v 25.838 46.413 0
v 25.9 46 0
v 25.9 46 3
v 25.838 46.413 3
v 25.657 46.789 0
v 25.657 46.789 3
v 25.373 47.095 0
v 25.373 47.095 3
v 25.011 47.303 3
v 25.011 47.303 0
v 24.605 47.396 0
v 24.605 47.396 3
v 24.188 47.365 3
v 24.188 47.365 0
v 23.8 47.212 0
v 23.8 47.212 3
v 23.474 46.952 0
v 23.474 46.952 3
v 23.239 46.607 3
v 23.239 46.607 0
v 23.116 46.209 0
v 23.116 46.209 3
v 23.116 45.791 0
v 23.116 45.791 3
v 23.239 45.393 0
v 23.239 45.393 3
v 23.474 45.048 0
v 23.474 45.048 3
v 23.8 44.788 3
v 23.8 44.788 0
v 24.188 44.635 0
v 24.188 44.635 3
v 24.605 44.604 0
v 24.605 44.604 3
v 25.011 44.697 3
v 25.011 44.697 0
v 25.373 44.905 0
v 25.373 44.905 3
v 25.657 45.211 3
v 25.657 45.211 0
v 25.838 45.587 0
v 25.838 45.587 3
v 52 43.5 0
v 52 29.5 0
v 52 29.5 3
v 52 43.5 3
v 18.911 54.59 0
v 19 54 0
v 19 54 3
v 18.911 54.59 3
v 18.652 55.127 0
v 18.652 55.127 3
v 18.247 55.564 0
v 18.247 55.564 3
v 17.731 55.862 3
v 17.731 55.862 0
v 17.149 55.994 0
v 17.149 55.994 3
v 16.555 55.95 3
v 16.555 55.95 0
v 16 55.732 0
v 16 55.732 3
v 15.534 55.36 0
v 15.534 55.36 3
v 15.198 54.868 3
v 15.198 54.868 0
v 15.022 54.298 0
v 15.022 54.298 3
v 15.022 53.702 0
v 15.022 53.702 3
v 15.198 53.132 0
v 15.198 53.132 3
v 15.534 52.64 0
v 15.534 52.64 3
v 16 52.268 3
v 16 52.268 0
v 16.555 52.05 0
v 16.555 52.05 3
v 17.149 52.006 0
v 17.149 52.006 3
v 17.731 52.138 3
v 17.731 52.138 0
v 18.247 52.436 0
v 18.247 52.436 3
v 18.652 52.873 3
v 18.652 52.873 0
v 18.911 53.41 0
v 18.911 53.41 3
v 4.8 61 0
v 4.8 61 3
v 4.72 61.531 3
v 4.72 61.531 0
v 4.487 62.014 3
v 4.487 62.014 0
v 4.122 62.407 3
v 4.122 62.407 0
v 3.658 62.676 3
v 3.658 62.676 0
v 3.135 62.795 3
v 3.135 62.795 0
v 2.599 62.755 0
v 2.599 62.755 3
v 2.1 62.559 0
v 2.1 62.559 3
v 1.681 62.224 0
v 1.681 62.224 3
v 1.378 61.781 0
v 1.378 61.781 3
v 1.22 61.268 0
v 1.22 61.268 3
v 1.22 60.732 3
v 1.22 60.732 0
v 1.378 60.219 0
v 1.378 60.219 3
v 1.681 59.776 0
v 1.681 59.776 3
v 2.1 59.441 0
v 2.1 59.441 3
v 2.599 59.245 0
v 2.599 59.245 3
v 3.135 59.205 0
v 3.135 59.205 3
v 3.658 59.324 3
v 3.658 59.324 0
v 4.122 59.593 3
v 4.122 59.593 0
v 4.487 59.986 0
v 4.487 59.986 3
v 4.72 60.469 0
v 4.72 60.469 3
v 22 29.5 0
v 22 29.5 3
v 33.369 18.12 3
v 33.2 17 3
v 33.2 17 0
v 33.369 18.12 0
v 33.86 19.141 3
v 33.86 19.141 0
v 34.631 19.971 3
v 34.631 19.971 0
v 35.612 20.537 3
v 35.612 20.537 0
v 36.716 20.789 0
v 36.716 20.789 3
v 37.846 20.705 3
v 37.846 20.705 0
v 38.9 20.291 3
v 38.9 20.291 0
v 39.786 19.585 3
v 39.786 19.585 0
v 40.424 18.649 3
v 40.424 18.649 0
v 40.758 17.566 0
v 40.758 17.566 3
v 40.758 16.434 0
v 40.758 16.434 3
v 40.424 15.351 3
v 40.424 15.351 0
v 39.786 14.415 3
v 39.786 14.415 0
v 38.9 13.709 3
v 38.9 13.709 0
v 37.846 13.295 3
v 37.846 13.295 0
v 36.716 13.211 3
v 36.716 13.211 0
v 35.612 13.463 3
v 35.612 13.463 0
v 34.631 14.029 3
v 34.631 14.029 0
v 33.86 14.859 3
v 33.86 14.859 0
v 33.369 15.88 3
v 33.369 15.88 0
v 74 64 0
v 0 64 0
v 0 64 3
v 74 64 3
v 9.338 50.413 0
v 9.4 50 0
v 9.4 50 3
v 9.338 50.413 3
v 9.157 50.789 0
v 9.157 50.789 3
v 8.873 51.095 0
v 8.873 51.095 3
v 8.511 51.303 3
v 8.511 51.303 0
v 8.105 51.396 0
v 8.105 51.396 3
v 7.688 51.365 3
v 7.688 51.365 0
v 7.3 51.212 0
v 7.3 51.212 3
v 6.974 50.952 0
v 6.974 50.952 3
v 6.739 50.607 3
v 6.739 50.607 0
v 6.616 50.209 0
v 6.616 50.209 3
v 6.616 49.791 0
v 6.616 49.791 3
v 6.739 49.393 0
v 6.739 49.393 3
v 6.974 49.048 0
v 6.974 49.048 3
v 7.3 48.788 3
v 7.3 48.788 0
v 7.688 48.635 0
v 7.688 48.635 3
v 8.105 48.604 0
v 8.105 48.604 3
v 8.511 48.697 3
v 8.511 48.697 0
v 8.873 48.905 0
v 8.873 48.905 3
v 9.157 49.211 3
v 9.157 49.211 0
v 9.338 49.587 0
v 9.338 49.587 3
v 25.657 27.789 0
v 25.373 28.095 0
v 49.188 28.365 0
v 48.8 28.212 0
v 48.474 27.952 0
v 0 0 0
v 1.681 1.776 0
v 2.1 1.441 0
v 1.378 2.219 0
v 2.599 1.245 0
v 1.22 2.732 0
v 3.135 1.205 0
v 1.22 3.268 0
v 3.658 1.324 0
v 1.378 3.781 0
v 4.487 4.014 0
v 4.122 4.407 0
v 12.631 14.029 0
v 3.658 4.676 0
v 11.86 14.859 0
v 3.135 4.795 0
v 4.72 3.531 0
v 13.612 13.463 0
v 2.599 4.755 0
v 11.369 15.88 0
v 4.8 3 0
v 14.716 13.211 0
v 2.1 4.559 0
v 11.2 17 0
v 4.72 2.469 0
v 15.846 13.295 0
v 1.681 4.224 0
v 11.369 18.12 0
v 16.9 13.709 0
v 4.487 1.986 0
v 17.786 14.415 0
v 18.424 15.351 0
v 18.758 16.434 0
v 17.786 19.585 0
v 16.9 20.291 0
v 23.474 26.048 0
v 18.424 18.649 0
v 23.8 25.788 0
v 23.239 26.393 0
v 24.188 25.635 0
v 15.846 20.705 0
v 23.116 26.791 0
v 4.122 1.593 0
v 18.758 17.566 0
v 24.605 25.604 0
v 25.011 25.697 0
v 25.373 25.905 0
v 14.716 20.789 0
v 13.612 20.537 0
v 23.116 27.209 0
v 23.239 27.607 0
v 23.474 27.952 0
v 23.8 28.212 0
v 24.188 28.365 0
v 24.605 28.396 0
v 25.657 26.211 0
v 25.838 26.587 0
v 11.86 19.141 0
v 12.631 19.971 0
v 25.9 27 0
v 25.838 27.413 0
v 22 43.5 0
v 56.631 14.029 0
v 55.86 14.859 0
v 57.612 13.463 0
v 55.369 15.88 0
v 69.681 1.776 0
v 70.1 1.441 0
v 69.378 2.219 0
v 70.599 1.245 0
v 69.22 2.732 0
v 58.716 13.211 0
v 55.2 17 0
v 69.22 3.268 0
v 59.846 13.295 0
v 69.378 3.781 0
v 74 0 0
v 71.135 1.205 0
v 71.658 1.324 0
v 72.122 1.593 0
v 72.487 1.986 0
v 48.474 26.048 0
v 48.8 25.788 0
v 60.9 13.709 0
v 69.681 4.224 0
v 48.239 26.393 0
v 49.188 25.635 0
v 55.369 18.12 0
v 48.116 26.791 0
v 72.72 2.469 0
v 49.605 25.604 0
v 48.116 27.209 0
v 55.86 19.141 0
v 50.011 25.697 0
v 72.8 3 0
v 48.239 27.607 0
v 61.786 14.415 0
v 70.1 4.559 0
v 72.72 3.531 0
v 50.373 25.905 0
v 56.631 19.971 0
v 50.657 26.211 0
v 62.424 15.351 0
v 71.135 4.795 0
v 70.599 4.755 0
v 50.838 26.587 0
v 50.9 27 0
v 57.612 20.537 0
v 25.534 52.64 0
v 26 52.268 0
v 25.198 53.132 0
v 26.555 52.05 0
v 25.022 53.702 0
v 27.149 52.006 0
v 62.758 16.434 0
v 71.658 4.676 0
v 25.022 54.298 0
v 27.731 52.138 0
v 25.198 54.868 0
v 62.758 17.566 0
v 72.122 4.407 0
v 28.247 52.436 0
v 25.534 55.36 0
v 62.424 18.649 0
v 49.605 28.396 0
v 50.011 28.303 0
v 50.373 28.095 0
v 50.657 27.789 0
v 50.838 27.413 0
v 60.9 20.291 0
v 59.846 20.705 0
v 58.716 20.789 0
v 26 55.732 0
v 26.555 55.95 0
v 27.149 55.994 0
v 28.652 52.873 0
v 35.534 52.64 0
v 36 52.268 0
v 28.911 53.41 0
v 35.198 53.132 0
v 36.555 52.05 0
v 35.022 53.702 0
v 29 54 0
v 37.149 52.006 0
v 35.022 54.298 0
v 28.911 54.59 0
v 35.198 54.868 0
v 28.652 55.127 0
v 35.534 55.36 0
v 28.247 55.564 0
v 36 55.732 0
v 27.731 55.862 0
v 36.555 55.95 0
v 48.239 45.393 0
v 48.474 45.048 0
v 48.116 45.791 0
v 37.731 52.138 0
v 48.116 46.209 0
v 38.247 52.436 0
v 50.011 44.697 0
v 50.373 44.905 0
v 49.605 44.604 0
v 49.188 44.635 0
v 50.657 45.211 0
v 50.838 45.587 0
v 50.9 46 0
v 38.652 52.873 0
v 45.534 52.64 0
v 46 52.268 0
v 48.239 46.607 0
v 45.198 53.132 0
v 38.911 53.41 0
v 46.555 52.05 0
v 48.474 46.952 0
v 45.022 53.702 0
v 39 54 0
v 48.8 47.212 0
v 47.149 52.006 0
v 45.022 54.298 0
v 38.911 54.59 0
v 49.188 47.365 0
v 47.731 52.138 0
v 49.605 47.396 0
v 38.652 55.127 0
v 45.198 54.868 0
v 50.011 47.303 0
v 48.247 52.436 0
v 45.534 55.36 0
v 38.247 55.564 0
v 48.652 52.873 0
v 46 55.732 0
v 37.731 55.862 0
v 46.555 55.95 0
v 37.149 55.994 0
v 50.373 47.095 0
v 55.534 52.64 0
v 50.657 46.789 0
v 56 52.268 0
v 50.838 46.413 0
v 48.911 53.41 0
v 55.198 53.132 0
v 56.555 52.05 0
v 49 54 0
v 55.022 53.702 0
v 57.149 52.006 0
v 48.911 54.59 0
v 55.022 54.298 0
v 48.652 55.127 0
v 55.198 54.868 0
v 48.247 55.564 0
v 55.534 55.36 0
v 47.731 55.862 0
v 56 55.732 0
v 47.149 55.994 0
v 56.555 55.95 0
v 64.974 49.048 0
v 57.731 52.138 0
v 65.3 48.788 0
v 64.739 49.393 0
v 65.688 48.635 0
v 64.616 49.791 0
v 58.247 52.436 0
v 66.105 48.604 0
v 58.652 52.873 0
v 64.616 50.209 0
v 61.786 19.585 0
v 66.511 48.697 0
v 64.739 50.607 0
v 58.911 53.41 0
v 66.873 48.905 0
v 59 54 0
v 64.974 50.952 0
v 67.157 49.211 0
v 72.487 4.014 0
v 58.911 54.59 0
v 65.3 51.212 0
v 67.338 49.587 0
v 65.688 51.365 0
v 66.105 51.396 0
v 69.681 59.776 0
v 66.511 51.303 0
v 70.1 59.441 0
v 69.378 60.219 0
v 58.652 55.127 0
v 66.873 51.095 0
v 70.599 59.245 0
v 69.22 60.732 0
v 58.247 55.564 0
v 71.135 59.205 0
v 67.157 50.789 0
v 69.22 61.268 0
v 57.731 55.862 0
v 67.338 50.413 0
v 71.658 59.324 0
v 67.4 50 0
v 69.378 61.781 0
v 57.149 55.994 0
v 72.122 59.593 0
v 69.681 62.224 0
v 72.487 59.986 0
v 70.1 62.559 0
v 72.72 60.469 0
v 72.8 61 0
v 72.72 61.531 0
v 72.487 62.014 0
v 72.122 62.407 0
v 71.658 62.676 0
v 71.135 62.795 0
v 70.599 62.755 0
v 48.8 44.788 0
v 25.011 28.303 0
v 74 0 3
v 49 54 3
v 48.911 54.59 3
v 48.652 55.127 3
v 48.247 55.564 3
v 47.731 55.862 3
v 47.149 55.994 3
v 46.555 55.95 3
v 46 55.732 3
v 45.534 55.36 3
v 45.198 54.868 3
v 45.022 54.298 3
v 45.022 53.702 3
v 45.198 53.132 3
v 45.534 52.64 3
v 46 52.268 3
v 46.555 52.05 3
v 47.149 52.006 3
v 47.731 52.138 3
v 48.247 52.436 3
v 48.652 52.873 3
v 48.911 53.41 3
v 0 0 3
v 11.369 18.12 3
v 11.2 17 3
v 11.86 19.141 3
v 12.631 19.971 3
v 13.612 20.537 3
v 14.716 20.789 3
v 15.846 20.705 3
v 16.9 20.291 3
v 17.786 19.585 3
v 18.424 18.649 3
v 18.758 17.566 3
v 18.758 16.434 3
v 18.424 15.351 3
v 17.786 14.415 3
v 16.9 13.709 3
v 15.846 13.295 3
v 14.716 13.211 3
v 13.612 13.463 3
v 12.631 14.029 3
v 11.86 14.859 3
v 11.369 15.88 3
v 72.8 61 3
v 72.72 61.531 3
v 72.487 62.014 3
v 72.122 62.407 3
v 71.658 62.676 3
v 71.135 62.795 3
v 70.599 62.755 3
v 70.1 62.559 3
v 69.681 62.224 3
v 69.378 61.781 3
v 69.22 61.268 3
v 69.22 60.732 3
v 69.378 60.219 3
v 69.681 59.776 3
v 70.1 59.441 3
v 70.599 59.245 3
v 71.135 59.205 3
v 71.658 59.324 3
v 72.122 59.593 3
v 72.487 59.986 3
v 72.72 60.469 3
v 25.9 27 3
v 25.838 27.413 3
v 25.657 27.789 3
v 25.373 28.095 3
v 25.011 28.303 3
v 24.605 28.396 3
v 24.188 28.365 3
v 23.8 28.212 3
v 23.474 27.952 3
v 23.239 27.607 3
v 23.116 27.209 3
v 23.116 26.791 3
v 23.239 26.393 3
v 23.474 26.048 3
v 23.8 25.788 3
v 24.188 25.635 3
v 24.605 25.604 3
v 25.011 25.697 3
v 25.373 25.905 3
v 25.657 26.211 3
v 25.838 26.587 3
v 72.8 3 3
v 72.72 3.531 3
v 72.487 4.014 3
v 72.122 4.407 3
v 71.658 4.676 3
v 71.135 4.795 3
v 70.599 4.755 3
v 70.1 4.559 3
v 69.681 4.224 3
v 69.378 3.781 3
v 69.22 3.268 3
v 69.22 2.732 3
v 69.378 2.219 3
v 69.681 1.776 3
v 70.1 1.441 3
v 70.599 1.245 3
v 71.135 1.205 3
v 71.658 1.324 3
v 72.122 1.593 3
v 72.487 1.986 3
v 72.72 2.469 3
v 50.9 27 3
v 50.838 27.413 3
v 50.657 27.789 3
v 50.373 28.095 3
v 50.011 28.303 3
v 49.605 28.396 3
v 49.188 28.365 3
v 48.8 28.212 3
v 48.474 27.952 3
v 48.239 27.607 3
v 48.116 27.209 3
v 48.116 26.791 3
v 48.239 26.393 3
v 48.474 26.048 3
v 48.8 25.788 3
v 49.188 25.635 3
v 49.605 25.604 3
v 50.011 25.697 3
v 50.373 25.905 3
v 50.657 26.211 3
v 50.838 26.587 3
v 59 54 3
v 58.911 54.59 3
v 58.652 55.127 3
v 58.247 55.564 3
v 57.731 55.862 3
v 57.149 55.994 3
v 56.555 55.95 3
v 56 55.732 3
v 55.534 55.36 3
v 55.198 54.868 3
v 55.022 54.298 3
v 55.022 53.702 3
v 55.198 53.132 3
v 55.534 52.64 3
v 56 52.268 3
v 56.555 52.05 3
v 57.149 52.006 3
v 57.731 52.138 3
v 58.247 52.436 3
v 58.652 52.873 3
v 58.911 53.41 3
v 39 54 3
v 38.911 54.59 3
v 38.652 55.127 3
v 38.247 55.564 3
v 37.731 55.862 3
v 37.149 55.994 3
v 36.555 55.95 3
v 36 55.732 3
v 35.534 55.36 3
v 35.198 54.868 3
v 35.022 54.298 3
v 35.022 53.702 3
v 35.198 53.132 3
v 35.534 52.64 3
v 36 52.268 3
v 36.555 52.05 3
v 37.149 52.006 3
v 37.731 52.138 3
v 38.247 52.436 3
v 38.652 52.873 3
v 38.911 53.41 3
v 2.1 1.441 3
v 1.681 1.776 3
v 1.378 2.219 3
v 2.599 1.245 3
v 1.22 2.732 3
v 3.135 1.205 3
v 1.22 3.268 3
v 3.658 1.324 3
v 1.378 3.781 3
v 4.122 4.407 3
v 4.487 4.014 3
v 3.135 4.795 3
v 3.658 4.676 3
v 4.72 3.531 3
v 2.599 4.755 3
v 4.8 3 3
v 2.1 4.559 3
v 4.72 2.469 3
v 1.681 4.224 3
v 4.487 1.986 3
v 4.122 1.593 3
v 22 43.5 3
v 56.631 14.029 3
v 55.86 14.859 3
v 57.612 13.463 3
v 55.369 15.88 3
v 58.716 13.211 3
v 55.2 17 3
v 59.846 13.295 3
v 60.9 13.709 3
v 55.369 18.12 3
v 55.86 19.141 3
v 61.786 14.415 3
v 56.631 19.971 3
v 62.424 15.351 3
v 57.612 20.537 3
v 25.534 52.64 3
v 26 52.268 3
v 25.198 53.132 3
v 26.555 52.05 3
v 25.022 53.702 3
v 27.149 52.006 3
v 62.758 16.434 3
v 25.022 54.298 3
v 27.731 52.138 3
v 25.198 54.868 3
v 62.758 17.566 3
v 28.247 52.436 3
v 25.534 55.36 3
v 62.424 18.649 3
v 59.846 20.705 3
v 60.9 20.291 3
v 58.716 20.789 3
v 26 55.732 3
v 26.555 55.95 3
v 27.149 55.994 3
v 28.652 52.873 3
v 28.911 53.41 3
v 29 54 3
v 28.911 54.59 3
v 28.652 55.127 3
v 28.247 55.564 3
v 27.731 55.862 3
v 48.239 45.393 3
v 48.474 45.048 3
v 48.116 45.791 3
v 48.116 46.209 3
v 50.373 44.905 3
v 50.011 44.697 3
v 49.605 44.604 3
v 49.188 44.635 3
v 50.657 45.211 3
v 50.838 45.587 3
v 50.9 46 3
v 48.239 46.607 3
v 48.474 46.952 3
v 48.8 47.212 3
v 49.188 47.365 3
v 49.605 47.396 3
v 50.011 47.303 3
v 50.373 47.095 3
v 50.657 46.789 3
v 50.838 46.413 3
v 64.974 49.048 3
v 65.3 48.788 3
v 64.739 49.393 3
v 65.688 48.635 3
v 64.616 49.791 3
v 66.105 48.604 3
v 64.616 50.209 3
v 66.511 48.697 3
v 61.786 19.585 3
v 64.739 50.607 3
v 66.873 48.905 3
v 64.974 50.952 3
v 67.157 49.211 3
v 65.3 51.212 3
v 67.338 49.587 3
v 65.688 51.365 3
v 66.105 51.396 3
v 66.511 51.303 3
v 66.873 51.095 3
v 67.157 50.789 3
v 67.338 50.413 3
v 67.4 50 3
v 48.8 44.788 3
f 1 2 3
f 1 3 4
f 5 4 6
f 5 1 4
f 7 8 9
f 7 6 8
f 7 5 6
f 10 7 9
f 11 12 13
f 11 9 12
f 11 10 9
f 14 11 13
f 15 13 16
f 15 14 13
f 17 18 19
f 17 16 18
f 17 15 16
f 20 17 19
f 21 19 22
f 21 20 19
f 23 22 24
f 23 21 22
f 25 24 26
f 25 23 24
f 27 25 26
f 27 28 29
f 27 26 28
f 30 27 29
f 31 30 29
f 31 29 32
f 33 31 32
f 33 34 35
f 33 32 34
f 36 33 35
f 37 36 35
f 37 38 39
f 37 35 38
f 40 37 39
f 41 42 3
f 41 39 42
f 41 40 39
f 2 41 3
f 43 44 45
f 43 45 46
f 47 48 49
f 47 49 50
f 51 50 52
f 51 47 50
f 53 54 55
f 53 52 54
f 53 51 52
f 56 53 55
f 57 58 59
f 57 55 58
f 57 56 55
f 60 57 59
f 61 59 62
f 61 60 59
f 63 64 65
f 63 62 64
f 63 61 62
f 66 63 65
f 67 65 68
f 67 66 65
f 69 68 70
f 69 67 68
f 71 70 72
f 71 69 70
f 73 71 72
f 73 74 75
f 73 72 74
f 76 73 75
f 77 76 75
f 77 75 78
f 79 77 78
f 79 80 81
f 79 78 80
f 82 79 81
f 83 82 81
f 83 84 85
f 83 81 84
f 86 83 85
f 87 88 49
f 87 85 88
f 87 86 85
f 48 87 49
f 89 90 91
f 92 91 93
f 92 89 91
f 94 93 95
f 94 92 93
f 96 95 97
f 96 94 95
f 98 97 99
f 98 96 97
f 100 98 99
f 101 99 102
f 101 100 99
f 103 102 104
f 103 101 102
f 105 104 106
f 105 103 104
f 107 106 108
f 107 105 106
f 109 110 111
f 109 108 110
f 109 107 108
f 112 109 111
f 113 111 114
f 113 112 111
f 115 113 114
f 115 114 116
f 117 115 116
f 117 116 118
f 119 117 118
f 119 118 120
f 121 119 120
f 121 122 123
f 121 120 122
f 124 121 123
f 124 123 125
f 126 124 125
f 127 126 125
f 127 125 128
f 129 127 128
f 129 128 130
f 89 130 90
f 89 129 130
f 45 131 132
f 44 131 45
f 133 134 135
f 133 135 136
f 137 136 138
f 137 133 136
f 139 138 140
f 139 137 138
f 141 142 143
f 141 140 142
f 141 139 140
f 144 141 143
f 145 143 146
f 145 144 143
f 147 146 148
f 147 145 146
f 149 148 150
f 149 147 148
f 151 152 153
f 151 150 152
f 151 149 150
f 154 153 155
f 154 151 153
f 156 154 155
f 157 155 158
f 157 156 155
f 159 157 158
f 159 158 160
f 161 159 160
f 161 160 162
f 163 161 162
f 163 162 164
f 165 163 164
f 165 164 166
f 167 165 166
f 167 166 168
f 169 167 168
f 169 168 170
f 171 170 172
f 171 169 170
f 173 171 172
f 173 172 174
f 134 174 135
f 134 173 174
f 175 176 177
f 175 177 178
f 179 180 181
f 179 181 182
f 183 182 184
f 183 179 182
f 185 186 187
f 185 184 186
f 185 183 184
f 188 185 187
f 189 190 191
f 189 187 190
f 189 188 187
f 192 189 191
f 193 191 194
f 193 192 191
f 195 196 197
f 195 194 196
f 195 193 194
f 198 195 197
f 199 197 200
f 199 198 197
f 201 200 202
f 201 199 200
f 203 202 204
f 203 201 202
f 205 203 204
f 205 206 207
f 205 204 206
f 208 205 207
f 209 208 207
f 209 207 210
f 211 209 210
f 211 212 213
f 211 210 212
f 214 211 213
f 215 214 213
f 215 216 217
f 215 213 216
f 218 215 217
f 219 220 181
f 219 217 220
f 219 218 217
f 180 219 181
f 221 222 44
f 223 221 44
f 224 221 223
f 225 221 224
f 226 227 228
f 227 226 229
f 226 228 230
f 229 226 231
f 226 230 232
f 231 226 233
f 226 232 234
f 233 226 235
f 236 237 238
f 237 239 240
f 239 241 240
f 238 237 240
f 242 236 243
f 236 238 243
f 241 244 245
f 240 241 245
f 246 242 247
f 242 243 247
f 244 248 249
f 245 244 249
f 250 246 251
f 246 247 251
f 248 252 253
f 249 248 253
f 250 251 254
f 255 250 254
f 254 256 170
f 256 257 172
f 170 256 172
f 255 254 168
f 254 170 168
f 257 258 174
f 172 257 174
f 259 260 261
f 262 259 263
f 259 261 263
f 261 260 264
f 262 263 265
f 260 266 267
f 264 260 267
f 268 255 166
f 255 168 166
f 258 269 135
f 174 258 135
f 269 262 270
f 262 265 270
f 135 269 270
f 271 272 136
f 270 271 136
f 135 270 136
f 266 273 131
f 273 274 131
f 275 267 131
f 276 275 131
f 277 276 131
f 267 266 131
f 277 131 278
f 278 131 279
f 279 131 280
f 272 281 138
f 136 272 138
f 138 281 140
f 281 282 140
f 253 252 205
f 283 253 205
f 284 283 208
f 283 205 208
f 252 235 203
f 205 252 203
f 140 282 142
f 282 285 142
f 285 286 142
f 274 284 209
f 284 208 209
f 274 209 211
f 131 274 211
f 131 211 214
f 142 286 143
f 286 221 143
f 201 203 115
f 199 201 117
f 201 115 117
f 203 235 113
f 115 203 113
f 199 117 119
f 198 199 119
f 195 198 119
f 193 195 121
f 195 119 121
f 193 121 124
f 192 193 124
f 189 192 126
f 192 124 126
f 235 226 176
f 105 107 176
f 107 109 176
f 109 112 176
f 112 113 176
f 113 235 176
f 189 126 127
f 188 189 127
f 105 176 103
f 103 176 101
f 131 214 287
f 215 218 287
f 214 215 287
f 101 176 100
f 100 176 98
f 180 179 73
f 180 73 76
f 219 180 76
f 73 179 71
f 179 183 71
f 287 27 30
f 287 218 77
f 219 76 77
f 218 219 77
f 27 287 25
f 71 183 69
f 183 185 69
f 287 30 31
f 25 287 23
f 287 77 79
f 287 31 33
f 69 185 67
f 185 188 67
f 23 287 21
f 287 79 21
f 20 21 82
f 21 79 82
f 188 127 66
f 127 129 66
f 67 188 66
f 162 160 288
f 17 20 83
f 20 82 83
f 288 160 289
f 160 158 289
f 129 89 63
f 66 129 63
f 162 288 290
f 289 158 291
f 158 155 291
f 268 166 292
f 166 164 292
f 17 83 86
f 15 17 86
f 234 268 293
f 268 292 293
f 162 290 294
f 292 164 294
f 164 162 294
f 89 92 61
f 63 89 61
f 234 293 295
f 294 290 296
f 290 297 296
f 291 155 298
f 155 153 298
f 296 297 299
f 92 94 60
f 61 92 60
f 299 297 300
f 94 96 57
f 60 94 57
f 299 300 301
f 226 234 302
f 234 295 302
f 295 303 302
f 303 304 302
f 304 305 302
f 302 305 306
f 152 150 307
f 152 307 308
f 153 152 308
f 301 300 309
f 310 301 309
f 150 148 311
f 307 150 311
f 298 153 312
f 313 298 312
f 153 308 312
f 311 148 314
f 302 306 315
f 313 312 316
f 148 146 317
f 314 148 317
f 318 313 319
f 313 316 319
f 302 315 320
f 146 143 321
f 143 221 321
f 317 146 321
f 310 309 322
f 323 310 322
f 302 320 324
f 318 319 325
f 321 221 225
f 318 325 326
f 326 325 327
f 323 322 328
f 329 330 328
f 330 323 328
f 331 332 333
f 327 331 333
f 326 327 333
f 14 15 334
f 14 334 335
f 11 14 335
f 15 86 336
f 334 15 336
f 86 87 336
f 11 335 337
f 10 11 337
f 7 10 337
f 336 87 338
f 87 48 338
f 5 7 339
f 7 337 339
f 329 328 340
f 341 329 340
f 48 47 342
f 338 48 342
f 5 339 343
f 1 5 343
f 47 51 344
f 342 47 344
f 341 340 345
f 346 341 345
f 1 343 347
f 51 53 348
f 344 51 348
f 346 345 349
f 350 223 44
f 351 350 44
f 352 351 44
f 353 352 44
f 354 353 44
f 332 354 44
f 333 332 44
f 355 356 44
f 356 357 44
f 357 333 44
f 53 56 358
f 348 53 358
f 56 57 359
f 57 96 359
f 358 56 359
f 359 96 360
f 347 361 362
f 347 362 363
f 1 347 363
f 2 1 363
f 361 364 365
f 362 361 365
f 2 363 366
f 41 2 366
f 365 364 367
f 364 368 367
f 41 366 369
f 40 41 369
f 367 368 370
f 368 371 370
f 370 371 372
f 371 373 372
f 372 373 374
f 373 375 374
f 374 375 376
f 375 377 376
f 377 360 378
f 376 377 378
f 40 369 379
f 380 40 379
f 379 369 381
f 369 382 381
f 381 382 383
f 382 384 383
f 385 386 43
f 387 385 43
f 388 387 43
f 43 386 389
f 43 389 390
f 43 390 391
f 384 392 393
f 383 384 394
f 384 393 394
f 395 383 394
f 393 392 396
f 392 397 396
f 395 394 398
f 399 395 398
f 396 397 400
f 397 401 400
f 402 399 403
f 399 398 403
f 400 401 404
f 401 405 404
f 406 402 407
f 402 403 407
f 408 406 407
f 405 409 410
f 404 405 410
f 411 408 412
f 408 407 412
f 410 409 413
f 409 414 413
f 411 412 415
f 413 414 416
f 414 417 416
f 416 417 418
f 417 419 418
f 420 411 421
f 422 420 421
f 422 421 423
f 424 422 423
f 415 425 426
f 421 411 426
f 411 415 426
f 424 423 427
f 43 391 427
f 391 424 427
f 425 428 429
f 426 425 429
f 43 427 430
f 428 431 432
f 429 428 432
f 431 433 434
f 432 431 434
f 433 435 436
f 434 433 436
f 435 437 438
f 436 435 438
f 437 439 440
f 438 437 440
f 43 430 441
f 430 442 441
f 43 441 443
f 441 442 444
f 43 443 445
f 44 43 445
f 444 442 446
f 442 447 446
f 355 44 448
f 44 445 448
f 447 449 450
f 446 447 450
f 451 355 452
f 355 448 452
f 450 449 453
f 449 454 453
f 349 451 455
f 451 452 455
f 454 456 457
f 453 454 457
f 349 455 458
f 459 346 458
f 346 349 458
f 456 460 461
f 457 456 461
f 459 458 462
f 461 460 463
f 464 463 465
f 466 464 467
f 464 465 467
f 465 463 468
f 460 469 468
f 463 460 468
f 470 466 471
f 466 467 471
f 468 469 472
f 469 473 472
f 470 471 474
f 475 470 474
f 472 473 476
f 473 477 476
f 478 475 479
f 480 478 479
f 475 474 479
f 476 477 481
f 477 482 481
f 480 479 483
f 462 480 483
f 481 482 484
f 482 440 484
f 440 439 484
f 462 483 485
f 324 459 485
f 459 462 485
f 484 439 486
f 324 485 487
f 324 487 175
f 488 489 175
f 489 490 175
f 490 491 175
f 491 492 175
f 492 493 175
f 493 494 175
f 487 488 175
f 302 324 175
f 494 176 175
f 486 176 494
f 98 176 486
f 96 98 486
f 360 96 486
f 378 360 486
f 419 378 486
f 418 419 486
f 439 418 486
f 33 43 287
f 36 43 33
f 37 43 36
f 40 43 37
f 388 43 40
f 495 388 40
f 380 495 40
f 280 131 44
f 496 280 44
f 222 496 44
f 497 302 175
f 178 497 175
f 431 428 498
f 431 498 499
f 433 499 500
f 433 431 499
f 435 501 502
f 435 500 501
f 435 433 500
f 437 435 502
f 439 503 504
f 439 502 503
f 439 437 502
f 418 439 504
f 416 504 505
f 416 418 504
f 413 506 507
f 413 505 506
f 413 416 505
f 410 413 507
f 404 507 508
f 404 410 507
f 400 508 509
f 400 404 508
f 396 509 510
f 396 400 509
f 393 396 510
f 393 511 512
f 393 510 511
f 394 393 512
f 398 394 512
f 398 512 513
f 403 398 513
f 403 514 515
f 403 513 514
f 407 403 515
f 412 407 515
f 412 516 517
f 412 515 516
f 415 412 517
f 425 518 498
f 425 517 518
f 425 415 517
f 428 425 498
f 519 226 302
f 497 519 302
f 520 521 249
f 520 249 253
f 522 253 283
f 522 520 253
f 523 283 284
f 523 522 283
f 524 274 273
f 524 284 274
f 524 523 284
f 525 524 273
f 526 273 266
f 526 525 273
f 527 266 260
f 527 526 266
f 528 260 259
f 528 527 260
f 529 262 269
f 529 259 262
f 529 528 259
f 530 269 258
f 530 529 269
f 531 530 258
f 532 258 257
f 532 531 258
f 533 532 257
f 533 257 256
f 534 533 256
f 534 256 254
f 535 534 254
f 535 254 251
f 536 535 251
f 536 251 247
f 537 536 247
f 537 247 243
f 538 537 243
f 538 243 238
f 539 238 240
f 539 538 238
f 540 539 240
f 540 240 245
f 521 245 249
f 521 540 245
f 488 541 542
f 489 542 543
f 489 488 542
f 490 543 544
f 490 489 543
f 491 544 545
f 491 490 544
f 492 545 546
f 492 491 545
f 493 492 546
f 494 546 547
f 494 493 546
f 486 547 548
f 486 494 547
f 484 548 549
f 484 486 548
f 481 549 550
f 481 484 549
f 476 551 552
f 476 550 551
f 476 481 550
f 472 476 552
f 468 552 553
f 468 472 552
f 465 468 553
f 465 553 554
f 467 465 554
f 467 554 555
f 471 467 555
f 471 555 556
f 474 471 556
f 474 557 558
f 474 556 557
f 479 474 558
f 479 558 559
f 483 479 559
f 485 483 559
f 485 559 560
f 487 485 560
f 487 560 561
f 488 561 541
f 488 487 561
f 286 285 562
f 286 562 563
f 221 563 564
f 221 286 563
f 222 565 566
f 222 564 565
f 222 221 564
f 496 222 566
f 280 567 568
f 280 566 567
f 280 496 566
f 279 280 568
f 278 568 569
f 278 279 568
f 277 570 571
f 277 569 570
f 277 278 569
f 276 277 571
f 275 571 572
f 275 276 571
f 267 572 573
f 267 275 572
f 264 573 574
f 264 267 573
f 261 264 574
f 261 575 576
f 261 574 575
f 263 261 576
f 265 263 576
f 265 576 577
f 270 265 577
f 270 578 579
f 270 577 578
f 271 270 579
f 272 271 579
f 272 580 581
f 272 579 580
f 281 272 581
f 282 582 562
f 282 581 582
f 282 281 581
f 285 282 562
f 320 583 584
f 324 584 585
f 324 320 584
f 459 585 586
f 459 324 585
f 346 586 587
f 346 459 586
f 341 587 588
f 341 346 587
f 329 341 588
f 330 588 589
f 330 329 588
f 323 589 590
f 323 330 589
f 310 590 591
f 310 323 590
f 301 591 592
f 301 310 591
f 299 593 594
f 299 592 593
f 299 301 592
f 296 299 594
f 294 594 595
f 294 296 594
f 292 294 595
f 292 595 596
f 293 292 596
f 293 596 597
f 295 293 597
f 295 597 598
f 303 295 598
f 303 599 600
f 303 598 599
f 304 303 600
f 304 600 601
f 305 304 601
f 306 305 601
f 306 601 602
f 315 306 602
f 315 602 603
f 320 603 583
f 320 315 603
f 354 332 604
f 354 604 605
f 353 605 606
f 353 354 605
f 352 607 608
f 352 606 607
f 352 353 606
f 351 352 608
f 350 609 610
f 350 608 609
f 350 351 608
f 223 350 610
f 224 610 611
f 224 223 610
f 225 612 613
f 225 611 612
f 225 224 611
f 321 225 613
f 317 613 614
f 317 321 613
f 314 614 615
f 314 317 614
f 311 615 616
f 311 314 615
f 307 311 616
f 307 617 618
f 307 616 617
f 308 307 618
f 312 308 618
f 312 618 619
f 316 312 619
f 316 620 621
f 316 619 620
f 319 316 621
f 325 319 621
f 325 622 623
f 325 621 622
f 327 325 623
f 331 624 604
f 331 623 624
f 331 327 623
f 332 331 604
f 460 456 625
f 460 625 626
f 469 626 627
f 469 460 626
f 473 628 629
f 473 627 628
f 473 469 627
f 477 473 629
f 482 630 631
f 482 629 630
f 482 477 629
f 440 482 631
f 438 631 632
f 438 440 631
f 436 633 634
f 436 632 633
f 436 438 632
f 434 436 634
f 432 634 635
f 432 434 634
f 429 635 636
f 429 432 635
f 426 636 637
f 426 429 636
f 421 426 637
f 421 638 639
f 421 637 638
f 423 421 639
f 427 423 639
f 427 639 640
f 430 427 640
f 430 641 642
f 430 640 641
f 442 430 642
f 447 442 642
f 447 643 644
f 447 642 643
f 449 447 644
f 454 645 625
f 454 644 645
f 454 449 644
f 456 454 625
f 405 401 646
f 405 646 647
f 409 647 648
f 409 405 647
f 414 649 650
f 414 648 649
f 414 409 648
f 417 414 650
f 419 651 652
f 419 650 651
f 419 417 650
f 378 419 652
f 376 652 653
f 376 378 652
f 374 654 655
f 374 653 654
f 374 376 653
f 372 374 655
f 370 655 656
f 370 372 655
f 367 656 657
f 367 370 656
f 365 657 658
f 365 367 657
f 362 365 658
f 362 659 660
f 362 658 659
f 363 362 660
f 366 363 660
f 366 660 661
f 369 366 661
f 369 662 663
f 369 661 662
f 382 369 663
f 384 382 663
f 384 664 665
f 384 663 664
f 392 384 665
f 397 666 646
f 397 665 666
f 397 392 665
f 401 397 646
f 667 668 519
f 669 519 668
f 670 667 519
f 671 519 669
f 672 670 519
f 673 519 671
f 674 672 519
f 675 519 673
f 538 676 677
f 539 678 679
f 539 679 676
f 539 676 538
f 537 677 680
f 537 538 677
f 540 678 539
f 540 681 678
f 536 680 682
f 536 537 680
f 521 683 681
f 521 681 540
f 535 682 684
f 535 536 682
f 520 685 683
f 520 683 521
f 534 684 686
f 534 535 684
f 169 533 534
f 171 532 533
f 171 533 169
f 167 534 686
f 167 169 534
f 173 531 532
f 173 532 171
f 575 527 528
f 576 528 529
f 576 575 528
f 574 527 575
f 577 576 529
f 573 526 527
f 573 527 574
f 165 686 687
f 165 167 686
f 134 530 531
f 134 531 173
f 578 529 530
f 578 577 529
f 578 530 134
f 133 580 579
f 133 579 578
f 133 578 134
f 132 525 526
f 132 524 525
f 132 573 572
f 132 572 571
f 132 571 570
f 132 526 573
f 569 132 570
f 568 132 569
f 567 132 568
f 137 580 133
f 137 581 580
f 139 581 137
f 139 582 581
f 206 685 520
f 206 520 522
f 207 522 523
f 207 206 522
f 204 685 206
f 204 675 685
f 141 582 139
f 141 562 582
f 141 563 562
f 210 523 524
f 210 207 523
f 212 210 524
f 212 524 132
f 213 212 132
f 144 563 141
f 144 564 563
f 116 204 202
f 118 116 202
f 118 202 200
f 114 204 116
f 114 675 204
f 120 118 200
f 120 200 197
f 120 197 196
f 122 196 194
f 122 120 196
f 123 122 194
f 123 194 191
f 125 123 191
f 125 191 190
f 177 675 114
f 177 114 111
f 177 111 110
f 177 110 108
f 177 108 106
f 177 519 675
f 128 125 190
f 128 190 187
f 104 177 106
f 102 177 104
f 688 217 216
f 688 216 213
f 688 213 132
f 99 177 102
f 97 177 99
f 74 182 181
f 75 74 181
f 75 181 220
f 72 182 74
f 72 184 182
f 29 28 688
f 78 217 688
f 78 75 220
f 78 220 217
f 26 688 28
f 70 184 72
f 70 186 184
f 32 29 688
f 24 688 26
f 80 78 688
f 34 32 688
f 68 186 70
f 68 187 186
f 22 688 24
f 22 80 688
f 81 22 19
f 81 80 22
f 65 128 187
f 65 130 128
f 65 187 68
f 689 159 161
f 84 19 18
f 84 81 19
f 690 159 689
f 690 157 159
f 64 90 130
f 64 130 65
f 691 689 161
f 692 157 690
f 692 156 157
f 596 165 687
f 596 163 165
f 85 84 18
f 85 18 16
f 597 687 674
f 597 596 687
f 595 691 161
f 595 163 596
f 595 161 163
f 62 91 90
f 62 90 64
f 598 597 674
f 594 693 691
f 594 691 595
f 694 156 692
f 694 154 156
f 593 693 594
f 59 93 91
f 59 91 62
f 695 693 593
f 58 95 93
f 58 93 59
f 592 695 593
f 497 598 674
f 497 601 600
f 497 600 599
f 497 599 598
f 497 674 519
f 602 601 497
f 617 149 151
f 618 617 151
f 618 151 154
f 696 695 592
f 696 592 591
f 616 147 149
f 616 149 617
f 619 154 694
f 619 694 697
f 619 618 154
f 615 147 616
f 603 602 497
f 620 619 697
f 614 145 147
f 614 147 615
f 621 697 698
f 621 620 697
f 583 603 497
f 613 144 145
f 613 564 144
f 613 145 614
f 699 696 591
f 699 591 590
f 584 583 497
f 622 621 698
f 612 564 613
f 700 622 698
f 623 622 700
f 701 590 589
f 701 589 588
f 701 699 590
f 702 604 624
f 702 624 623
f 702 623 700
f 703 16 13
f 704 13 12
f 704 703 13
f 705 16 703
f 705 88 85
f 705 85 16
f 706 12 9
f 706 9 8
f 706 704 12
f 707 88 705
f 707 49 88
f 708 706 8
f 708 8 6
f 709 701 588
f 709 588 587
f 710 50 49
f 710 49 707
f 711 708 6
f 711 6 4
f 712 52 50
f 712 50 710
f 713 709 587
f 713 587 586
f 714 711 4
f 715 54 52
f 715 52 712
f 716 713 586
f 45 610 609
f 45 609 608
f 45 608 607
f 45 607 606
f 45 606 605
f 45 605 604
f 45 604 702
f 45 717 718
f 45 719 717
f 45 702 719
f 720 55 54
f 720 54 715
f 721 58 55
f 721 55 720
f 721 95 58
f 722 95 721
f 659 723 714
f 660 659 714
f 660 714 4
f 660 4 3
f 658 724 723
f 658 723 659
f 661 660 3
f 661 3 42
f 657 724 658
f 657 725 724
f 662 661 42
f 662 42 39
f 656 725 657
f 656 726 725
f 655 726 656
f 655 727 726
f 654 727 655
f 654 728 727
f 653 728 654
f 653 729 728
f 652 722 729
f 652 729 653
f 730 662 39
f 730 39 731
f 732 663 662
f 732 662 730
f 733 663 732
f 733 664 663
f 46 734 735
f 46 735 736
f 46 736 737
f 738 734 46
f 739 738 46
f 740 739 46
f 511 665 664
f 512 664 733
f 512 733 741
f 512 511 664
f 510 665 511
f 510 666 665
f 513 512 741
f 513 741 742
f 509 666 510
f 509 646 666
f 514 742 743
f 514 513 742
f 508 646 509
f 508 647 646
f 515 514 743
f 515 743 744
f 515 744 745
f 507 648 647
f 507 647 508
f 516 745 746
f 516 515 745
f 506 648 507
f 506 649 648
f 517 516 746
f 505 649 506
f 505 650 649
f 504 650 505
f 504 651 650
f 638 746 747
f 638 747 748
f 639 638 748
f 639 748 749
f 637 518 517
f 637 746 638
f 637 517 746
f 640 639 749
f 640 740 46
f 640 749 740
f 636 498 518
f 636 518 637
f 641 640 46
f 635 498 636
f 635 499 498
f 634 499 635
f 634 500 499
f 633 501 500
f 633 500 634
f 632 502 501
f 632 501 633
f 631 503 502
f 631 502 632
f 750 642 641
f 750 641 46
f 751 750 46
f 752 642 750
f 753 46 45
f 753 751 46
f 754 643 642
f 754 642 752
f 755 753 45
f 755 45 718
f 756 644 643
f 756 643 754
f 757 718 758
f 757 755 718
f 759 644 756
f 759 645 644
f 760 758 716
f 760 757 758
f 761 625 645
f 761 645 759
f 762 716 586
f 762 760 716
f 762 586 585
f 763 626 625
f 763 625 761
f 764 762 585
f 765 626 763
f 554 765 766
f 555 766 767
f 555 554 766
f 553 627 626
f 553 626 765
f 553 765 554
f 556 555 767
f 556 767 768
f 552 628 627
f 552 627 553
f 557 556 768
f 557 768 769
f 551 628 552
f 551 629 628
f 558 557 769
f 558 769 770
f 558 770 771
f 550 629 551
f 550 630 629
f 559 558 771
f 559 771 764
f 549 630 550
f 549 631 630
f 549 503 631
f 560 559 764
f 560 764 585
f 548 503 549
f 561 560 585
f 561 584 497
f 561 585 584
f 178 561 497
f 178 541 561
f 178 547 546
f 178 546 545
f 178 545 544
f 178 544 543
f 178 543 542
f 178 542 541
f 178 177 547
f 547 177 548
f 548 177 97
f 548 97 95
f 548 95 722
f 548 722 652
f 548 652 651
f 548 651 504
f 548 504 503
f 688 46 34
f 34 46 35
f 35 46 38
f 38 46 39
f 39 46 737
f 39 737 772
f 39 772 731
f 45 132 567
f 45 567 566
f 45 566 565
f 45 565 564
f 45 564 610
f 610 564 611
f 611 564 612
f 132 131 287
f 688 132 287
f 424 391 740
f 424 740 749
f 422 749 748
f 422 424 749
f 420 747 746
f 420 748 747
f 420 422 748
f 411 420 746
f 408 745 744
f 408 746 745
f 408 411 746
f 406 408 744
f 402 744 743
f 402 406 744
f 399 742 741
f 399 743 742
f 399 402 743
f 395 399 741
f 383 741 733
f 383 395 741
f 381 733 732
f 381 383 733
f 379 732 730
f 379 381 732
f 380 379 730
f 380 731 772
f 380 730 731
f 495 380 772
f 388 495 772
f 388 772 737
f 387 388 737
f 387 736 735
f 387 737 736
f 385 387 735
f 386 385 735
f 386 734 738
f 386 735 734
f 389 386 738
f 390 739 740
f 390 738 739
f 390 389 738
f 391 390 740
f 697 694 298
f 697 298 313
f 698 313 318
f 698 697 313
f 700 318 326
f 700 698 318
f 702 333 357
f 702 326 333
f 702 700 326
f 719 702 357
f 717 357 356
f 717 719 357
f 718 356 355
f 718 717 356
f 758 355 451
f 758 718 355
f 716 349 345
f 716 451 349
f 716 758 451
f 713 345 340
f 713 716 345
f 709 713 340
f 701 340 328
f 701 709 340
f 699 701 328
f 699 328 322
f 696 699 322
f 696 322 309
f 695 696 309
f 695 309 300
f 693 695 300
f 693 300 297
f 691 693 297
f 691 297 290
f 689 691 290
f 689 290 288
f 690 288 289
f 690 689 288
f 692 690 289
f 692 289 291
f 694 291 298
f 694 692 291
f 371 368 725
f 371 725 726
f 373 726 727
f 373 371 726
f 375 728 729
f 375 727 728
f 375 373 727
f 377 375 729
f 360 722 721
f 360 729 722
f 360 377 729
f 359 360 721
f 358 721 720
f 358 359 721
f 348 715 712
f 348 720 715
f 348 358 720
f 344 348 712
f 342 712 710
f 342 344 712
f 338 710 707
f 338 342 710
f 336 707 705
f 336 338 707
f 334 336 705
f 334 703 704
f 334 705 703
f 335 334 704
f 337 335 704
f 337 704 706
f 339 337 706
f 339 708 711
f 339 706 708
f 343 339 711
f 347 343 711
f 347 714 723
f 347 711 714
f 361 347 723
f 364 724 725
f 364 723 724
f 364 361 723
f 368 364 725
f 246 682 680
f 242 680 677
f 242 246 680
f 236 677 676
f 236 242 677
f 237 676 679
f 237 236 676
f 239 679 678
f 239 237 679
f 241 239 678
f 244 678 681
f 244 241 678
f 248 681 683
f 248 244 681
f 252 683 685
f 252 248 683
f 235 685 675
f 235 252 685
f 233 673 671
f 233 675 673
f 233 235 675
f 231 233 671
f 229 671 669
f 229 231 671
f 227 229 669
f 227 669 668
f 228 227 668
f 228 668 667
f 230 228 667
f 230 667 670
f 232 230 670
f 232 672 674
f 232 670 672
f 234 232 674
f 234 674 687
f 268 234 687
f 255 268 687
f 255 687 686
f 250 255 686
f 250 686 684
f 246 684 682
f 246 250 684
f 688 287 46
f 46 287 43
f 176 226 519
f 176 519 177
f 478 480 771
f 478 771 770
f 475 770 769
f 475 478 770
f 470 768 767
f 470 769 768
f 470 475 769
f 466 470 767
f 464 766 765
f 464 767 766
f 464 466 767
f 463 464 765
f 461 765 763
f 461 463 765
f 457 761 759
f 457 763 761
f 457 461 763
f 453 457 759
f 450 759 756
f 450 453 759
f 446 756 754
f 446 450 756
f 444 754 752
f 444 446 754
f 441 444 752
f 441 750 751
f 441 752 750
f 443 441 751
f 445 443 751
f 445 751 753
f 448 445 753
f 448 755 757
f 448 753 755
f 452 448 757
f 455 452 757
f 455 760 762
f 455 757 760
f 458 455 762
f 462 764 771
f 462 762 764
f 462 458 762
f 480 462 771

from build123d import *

# Parameters (mm, degrees)
CYLINDER_R              = 3.8
CYLINDER_DEPTH          = 50
CYLINDER001_R           = 10
CYLINDER001_DEPTH       = 15
BOX001_W                = 12
BOX001_H                = 12
BOX001_DEPTH            = 10
BODY003_PLACEMENT_ANGLE = 180
CYLINDER012_R           = 2
CYLINDER012_DEPTH       = 20
ARRAY008_X_COUNT        = 5
ARRAY008_X_PITCH        = 10
CYLINDER013_R           = 1.4
CYLINDER013_DEPTH       = 20
ARRAY009_X_COUNT        = 2
ARRAY009_X_PITCH        = 58
ARRAY010_X_COUNT        = 2
ARRAY010_X_PITCH        = 25
ARRAY010_Y_COUNT        = 2
ARRAY010_Y_PITCH        = 19
BOX011_W                = 30
BOX011_H                = 14
BOX011_DEPTH            = 20
CYLINDER011_R           = 1.8
CYLINDER011_DEPTH       = 20
ARRAY007_X_COUNT        = 2
ARRAY007_X_PITCH        = 68
ARRAY007_Y_COUNT        = 2
ARRAY007_Y_PITCH        = 58
BOX009_W                = 74
BOX009_H                = 64
BOX009_DEPTH            = 3


with BuildPart() as encoder_hole:
    # Cylinder → Cylinder (new body)
    with BuildSketch(Plane.XY):
        Circle(CYLINDER_R)
    extrude(amount=CYLINDER_DEPTH)


with BuildPart() as encoder_cap:
    # Cylinder001 → Cylinder001 (new body)
    with BuildSketch(Plane.XY.offset(35)):
        Circle(CYLINDER001_R)
    extrude(amount=CYLINDER001_DEPTH)


with BuildPart() as encoder_fusion:
    # Box001 → Box001 (new body)
    with BuildSketch(Plane(origin=(-6, -6, 0), x_dir=(1, 0, 0), z_dir=(0, 0, 1))):
        with Locations((6, 6)):
            Rectangle(BOX001_W, BOX001_H)
    extrude(amount=BOX001_DEPTH)

    # Fusion: union encoder hole, encoder cap
    add(encoder_hole.part)
    add(encoder_cap.part)


with BuildPart() as encoder_fusion_1:
    # Fusion placement: moved
    add(encoder_fusion.part.moved(Location((0, 0, -20))))


with BuildPart() as encoder_clone001:
    # Body001 base: copy of encoder fusion
    add(encoder_fusion_1.part)


with BuildPart() as encoder_clone001_1:
    # Clone001 placement: moved
    add(encoder_clone001.part.moved(Location((0, 0, 20))))


with BuildPart() as encoder_clone001_2:
    # Body001 placement: moved
    add(encoder_clone001_1.part.moved(Location((22, 0, -20))))


with BuildPart() as encoder_compound_clone001:
    # Body base: copy of encoder fusion
    add(encoder_fusion_1.part)


with BuildPart() as encoder_compound_clone001_1:
    # Clone placement: moved
    add(encoder_compound_clone001.part.moved(Location((0, 0, 20))))


with BuildPart() as encoder_compound_clone001_2:
    # Body placement: moved
    add(encoder_compound_clone001_1.part.moved(Location((44, 0, -20))))

    # Compound: union encoder clone001, encoder fusion
    add(encoder_clone001_2.part)
    add(encoder_fusion_1.part)


with BuildPart() as encoder_compound_clone001_3:
    # Body003 placement: moved
    add(encoder_compound_clone001_2.part.moved(Location((59, 17, -2))).rotate(Axis((59, 17, -2), (0, 1, 0)), BODY003_PLACEMENT_ANGLE))


with BuildPart() as button_hole_array:
    # Cylinder012 → Cylinder012 (new body)
    with BuildSketch(Plane.XY):
        Circle(CYLINDER012_R)
    extrude(amount=CYLINDER012_DEPTH)

    # Array008 X: button hole array ×5


with BuildPart() as button_hole_array_1:
    add(button_hole_array.part)
    with Locations(*[(i * ARRAY008_X_PITCH, 0, 0) for i in range(1, ARRAY008_X_COUNT)]):
        add(button_hole_array.part)


with BuildPart() as button_hole_array_2:
    # Array008 placement: moved
    add(button_hole_array_1.part.moved(Location((17, 54, -9))))


with BuildPart() as m2_5_bolt_hole:
    # Cylinder013 → Cylinder013 (new body)
    with BuildSketch(Plane.XY):
        Circle(CYLINDER013_R)
    extrude(amount=CYLINDER013_DEPTH)


with BuildPart() as m2_5_bolt_hole_array:
    # Array009 base: copy of m2.5 bolt hole
    add(m2_5_bolt_hole.part)

    # Array009 X: m2.5 bolt hole array ×2


with BuildPart() as m2_5_bolt_hole_array_1:
    add(m2_5_bolt_hole_array.part)
    with Locations(*[(i * ARRAY009_X_PITCH, 0, 0) for i in range(1, ARRAY009_X_COUNT)]):
        add(m2_5_bolt_hole_array.part)


with BuildPart() as m2_5_bolt_hole_array_2:
    # Array009 placement: moved
    add(m2_5_bolt_hole_array_1.part.moved(Location((8, 50, -8))))


with BuildPart() as m2_5_bolt_hole_array001:
    # Body004 base: copy of m2.5 bolt hole
    add(m2_5_bolt_hole.part)

    # Array010 X: m2.5 bolt hole array001 ×2


with BuildPart() as m2_5_bolt_hole_array001_1:
    add(m2_5_bolt_hole_array001.part)
    with Locations(*[(i * ARRAY010_X_PITCH, 0, 0) for i in range(1, ARRAY010_X_COUNT)]):
        add(m2_5_bolt_hole_array001.part)

    # Array010 Y: m2.5 bolt hole array001 ×2


with BuildPart() as m2_5_bolt_hole_array001_2:
    add(m2_5_bolt_hole_array001_1.part)
    with Locations(*[(0, i * ARRAY010_Y_PITCH, 0) for i in range(1, ARRAY010_Y_COUNT)]):
        add(m2_5_bolt_hole_array001_1.part)


with BuildPart() as tft_hole_fusion:
    # Box011 → Box011 (new body)
    with BuildSketch(Plane(origin=(-2.5, 2.5, 0), x_dir=(1, 0, 0), z_dir=(0, 0, 1))):
        with Locations((15, 7)):
            Rectangle(BOX011_W, BOX011_H)
    extrude(amount=BOX011_DEPTH)

    # Fusion006: union m2.5 bolt hole array001
    add(m2_5_bolt_hole_array001_2.part)


with BuildPart() as tft_hole_fusion_1:
    # Fusion006 placement: moved
    add(tft_hole_fusion.part.moved(Location((24.5, 27, -5))))


with BuildPart() as bottom_plate_hole_fusion001:
    # Cylinder011 → Cylinder011 (new body)
    with BuildSketch(Plane(origin=(3, 3, 0), x_dir=(1, 0, 0), z_dir=(0, 0, 1))):
        Circle(CYLINDER011_R)
    extrude(amount=CYLINDER011_DEPTH)

    # Array007 X: bottom plate hole fusion001 ×2


with BuildPart() as bottom_plate_hole_fusion001_1:
    add(bottom_plate_hole_fusion001.part)
    with Locations(*[(i * ARRAY007_X_PITCH, 0, 0) for i in range(1, ARRAY007_X_COUNT)]):
        add(bottom_plate_hole_fusion001.part)

    # Array007 Y: bottom plate hole fusion001 ×2


with BuildPart() as bottom_plate_hole_fusion001_2:
    add(bottom_plate_hole_fusion001_1.part)
    with Locations(*[(0, i * ARRAY007_Y_PITCH, 0) for i in range(1, ARRAY007_Y_COUNT)]):
        add(bottom_plate_hole_fusion001_1.part)

    # Fusion005: union encoder compound clone001, button hole array, m2.5 bolt hole array, tft hole fusion
    add(encoder_compound_clone001_3.part)
    add(button_hole_array_2.part)
    add(m2_5_bolt_hole_array_2.part)
    add(tft_hole_fusion_1.part)


with BuildPart() as top_plate_cut:
    # Box009 → Box009 (new body)
    with BuildSketch(Plane.XY):
        with Locations((37, 32)):
            Rectangle(BOX009_W, BOX009_H)
    extrude(amount=BOX009_DEPTH)

    # Cut006: cut bottom plate hole fusion001
    add(bottom_plate_hole_fusion001_2.part, mode=Mode.SUBTRACT)


solid = top_plate_cut.part
